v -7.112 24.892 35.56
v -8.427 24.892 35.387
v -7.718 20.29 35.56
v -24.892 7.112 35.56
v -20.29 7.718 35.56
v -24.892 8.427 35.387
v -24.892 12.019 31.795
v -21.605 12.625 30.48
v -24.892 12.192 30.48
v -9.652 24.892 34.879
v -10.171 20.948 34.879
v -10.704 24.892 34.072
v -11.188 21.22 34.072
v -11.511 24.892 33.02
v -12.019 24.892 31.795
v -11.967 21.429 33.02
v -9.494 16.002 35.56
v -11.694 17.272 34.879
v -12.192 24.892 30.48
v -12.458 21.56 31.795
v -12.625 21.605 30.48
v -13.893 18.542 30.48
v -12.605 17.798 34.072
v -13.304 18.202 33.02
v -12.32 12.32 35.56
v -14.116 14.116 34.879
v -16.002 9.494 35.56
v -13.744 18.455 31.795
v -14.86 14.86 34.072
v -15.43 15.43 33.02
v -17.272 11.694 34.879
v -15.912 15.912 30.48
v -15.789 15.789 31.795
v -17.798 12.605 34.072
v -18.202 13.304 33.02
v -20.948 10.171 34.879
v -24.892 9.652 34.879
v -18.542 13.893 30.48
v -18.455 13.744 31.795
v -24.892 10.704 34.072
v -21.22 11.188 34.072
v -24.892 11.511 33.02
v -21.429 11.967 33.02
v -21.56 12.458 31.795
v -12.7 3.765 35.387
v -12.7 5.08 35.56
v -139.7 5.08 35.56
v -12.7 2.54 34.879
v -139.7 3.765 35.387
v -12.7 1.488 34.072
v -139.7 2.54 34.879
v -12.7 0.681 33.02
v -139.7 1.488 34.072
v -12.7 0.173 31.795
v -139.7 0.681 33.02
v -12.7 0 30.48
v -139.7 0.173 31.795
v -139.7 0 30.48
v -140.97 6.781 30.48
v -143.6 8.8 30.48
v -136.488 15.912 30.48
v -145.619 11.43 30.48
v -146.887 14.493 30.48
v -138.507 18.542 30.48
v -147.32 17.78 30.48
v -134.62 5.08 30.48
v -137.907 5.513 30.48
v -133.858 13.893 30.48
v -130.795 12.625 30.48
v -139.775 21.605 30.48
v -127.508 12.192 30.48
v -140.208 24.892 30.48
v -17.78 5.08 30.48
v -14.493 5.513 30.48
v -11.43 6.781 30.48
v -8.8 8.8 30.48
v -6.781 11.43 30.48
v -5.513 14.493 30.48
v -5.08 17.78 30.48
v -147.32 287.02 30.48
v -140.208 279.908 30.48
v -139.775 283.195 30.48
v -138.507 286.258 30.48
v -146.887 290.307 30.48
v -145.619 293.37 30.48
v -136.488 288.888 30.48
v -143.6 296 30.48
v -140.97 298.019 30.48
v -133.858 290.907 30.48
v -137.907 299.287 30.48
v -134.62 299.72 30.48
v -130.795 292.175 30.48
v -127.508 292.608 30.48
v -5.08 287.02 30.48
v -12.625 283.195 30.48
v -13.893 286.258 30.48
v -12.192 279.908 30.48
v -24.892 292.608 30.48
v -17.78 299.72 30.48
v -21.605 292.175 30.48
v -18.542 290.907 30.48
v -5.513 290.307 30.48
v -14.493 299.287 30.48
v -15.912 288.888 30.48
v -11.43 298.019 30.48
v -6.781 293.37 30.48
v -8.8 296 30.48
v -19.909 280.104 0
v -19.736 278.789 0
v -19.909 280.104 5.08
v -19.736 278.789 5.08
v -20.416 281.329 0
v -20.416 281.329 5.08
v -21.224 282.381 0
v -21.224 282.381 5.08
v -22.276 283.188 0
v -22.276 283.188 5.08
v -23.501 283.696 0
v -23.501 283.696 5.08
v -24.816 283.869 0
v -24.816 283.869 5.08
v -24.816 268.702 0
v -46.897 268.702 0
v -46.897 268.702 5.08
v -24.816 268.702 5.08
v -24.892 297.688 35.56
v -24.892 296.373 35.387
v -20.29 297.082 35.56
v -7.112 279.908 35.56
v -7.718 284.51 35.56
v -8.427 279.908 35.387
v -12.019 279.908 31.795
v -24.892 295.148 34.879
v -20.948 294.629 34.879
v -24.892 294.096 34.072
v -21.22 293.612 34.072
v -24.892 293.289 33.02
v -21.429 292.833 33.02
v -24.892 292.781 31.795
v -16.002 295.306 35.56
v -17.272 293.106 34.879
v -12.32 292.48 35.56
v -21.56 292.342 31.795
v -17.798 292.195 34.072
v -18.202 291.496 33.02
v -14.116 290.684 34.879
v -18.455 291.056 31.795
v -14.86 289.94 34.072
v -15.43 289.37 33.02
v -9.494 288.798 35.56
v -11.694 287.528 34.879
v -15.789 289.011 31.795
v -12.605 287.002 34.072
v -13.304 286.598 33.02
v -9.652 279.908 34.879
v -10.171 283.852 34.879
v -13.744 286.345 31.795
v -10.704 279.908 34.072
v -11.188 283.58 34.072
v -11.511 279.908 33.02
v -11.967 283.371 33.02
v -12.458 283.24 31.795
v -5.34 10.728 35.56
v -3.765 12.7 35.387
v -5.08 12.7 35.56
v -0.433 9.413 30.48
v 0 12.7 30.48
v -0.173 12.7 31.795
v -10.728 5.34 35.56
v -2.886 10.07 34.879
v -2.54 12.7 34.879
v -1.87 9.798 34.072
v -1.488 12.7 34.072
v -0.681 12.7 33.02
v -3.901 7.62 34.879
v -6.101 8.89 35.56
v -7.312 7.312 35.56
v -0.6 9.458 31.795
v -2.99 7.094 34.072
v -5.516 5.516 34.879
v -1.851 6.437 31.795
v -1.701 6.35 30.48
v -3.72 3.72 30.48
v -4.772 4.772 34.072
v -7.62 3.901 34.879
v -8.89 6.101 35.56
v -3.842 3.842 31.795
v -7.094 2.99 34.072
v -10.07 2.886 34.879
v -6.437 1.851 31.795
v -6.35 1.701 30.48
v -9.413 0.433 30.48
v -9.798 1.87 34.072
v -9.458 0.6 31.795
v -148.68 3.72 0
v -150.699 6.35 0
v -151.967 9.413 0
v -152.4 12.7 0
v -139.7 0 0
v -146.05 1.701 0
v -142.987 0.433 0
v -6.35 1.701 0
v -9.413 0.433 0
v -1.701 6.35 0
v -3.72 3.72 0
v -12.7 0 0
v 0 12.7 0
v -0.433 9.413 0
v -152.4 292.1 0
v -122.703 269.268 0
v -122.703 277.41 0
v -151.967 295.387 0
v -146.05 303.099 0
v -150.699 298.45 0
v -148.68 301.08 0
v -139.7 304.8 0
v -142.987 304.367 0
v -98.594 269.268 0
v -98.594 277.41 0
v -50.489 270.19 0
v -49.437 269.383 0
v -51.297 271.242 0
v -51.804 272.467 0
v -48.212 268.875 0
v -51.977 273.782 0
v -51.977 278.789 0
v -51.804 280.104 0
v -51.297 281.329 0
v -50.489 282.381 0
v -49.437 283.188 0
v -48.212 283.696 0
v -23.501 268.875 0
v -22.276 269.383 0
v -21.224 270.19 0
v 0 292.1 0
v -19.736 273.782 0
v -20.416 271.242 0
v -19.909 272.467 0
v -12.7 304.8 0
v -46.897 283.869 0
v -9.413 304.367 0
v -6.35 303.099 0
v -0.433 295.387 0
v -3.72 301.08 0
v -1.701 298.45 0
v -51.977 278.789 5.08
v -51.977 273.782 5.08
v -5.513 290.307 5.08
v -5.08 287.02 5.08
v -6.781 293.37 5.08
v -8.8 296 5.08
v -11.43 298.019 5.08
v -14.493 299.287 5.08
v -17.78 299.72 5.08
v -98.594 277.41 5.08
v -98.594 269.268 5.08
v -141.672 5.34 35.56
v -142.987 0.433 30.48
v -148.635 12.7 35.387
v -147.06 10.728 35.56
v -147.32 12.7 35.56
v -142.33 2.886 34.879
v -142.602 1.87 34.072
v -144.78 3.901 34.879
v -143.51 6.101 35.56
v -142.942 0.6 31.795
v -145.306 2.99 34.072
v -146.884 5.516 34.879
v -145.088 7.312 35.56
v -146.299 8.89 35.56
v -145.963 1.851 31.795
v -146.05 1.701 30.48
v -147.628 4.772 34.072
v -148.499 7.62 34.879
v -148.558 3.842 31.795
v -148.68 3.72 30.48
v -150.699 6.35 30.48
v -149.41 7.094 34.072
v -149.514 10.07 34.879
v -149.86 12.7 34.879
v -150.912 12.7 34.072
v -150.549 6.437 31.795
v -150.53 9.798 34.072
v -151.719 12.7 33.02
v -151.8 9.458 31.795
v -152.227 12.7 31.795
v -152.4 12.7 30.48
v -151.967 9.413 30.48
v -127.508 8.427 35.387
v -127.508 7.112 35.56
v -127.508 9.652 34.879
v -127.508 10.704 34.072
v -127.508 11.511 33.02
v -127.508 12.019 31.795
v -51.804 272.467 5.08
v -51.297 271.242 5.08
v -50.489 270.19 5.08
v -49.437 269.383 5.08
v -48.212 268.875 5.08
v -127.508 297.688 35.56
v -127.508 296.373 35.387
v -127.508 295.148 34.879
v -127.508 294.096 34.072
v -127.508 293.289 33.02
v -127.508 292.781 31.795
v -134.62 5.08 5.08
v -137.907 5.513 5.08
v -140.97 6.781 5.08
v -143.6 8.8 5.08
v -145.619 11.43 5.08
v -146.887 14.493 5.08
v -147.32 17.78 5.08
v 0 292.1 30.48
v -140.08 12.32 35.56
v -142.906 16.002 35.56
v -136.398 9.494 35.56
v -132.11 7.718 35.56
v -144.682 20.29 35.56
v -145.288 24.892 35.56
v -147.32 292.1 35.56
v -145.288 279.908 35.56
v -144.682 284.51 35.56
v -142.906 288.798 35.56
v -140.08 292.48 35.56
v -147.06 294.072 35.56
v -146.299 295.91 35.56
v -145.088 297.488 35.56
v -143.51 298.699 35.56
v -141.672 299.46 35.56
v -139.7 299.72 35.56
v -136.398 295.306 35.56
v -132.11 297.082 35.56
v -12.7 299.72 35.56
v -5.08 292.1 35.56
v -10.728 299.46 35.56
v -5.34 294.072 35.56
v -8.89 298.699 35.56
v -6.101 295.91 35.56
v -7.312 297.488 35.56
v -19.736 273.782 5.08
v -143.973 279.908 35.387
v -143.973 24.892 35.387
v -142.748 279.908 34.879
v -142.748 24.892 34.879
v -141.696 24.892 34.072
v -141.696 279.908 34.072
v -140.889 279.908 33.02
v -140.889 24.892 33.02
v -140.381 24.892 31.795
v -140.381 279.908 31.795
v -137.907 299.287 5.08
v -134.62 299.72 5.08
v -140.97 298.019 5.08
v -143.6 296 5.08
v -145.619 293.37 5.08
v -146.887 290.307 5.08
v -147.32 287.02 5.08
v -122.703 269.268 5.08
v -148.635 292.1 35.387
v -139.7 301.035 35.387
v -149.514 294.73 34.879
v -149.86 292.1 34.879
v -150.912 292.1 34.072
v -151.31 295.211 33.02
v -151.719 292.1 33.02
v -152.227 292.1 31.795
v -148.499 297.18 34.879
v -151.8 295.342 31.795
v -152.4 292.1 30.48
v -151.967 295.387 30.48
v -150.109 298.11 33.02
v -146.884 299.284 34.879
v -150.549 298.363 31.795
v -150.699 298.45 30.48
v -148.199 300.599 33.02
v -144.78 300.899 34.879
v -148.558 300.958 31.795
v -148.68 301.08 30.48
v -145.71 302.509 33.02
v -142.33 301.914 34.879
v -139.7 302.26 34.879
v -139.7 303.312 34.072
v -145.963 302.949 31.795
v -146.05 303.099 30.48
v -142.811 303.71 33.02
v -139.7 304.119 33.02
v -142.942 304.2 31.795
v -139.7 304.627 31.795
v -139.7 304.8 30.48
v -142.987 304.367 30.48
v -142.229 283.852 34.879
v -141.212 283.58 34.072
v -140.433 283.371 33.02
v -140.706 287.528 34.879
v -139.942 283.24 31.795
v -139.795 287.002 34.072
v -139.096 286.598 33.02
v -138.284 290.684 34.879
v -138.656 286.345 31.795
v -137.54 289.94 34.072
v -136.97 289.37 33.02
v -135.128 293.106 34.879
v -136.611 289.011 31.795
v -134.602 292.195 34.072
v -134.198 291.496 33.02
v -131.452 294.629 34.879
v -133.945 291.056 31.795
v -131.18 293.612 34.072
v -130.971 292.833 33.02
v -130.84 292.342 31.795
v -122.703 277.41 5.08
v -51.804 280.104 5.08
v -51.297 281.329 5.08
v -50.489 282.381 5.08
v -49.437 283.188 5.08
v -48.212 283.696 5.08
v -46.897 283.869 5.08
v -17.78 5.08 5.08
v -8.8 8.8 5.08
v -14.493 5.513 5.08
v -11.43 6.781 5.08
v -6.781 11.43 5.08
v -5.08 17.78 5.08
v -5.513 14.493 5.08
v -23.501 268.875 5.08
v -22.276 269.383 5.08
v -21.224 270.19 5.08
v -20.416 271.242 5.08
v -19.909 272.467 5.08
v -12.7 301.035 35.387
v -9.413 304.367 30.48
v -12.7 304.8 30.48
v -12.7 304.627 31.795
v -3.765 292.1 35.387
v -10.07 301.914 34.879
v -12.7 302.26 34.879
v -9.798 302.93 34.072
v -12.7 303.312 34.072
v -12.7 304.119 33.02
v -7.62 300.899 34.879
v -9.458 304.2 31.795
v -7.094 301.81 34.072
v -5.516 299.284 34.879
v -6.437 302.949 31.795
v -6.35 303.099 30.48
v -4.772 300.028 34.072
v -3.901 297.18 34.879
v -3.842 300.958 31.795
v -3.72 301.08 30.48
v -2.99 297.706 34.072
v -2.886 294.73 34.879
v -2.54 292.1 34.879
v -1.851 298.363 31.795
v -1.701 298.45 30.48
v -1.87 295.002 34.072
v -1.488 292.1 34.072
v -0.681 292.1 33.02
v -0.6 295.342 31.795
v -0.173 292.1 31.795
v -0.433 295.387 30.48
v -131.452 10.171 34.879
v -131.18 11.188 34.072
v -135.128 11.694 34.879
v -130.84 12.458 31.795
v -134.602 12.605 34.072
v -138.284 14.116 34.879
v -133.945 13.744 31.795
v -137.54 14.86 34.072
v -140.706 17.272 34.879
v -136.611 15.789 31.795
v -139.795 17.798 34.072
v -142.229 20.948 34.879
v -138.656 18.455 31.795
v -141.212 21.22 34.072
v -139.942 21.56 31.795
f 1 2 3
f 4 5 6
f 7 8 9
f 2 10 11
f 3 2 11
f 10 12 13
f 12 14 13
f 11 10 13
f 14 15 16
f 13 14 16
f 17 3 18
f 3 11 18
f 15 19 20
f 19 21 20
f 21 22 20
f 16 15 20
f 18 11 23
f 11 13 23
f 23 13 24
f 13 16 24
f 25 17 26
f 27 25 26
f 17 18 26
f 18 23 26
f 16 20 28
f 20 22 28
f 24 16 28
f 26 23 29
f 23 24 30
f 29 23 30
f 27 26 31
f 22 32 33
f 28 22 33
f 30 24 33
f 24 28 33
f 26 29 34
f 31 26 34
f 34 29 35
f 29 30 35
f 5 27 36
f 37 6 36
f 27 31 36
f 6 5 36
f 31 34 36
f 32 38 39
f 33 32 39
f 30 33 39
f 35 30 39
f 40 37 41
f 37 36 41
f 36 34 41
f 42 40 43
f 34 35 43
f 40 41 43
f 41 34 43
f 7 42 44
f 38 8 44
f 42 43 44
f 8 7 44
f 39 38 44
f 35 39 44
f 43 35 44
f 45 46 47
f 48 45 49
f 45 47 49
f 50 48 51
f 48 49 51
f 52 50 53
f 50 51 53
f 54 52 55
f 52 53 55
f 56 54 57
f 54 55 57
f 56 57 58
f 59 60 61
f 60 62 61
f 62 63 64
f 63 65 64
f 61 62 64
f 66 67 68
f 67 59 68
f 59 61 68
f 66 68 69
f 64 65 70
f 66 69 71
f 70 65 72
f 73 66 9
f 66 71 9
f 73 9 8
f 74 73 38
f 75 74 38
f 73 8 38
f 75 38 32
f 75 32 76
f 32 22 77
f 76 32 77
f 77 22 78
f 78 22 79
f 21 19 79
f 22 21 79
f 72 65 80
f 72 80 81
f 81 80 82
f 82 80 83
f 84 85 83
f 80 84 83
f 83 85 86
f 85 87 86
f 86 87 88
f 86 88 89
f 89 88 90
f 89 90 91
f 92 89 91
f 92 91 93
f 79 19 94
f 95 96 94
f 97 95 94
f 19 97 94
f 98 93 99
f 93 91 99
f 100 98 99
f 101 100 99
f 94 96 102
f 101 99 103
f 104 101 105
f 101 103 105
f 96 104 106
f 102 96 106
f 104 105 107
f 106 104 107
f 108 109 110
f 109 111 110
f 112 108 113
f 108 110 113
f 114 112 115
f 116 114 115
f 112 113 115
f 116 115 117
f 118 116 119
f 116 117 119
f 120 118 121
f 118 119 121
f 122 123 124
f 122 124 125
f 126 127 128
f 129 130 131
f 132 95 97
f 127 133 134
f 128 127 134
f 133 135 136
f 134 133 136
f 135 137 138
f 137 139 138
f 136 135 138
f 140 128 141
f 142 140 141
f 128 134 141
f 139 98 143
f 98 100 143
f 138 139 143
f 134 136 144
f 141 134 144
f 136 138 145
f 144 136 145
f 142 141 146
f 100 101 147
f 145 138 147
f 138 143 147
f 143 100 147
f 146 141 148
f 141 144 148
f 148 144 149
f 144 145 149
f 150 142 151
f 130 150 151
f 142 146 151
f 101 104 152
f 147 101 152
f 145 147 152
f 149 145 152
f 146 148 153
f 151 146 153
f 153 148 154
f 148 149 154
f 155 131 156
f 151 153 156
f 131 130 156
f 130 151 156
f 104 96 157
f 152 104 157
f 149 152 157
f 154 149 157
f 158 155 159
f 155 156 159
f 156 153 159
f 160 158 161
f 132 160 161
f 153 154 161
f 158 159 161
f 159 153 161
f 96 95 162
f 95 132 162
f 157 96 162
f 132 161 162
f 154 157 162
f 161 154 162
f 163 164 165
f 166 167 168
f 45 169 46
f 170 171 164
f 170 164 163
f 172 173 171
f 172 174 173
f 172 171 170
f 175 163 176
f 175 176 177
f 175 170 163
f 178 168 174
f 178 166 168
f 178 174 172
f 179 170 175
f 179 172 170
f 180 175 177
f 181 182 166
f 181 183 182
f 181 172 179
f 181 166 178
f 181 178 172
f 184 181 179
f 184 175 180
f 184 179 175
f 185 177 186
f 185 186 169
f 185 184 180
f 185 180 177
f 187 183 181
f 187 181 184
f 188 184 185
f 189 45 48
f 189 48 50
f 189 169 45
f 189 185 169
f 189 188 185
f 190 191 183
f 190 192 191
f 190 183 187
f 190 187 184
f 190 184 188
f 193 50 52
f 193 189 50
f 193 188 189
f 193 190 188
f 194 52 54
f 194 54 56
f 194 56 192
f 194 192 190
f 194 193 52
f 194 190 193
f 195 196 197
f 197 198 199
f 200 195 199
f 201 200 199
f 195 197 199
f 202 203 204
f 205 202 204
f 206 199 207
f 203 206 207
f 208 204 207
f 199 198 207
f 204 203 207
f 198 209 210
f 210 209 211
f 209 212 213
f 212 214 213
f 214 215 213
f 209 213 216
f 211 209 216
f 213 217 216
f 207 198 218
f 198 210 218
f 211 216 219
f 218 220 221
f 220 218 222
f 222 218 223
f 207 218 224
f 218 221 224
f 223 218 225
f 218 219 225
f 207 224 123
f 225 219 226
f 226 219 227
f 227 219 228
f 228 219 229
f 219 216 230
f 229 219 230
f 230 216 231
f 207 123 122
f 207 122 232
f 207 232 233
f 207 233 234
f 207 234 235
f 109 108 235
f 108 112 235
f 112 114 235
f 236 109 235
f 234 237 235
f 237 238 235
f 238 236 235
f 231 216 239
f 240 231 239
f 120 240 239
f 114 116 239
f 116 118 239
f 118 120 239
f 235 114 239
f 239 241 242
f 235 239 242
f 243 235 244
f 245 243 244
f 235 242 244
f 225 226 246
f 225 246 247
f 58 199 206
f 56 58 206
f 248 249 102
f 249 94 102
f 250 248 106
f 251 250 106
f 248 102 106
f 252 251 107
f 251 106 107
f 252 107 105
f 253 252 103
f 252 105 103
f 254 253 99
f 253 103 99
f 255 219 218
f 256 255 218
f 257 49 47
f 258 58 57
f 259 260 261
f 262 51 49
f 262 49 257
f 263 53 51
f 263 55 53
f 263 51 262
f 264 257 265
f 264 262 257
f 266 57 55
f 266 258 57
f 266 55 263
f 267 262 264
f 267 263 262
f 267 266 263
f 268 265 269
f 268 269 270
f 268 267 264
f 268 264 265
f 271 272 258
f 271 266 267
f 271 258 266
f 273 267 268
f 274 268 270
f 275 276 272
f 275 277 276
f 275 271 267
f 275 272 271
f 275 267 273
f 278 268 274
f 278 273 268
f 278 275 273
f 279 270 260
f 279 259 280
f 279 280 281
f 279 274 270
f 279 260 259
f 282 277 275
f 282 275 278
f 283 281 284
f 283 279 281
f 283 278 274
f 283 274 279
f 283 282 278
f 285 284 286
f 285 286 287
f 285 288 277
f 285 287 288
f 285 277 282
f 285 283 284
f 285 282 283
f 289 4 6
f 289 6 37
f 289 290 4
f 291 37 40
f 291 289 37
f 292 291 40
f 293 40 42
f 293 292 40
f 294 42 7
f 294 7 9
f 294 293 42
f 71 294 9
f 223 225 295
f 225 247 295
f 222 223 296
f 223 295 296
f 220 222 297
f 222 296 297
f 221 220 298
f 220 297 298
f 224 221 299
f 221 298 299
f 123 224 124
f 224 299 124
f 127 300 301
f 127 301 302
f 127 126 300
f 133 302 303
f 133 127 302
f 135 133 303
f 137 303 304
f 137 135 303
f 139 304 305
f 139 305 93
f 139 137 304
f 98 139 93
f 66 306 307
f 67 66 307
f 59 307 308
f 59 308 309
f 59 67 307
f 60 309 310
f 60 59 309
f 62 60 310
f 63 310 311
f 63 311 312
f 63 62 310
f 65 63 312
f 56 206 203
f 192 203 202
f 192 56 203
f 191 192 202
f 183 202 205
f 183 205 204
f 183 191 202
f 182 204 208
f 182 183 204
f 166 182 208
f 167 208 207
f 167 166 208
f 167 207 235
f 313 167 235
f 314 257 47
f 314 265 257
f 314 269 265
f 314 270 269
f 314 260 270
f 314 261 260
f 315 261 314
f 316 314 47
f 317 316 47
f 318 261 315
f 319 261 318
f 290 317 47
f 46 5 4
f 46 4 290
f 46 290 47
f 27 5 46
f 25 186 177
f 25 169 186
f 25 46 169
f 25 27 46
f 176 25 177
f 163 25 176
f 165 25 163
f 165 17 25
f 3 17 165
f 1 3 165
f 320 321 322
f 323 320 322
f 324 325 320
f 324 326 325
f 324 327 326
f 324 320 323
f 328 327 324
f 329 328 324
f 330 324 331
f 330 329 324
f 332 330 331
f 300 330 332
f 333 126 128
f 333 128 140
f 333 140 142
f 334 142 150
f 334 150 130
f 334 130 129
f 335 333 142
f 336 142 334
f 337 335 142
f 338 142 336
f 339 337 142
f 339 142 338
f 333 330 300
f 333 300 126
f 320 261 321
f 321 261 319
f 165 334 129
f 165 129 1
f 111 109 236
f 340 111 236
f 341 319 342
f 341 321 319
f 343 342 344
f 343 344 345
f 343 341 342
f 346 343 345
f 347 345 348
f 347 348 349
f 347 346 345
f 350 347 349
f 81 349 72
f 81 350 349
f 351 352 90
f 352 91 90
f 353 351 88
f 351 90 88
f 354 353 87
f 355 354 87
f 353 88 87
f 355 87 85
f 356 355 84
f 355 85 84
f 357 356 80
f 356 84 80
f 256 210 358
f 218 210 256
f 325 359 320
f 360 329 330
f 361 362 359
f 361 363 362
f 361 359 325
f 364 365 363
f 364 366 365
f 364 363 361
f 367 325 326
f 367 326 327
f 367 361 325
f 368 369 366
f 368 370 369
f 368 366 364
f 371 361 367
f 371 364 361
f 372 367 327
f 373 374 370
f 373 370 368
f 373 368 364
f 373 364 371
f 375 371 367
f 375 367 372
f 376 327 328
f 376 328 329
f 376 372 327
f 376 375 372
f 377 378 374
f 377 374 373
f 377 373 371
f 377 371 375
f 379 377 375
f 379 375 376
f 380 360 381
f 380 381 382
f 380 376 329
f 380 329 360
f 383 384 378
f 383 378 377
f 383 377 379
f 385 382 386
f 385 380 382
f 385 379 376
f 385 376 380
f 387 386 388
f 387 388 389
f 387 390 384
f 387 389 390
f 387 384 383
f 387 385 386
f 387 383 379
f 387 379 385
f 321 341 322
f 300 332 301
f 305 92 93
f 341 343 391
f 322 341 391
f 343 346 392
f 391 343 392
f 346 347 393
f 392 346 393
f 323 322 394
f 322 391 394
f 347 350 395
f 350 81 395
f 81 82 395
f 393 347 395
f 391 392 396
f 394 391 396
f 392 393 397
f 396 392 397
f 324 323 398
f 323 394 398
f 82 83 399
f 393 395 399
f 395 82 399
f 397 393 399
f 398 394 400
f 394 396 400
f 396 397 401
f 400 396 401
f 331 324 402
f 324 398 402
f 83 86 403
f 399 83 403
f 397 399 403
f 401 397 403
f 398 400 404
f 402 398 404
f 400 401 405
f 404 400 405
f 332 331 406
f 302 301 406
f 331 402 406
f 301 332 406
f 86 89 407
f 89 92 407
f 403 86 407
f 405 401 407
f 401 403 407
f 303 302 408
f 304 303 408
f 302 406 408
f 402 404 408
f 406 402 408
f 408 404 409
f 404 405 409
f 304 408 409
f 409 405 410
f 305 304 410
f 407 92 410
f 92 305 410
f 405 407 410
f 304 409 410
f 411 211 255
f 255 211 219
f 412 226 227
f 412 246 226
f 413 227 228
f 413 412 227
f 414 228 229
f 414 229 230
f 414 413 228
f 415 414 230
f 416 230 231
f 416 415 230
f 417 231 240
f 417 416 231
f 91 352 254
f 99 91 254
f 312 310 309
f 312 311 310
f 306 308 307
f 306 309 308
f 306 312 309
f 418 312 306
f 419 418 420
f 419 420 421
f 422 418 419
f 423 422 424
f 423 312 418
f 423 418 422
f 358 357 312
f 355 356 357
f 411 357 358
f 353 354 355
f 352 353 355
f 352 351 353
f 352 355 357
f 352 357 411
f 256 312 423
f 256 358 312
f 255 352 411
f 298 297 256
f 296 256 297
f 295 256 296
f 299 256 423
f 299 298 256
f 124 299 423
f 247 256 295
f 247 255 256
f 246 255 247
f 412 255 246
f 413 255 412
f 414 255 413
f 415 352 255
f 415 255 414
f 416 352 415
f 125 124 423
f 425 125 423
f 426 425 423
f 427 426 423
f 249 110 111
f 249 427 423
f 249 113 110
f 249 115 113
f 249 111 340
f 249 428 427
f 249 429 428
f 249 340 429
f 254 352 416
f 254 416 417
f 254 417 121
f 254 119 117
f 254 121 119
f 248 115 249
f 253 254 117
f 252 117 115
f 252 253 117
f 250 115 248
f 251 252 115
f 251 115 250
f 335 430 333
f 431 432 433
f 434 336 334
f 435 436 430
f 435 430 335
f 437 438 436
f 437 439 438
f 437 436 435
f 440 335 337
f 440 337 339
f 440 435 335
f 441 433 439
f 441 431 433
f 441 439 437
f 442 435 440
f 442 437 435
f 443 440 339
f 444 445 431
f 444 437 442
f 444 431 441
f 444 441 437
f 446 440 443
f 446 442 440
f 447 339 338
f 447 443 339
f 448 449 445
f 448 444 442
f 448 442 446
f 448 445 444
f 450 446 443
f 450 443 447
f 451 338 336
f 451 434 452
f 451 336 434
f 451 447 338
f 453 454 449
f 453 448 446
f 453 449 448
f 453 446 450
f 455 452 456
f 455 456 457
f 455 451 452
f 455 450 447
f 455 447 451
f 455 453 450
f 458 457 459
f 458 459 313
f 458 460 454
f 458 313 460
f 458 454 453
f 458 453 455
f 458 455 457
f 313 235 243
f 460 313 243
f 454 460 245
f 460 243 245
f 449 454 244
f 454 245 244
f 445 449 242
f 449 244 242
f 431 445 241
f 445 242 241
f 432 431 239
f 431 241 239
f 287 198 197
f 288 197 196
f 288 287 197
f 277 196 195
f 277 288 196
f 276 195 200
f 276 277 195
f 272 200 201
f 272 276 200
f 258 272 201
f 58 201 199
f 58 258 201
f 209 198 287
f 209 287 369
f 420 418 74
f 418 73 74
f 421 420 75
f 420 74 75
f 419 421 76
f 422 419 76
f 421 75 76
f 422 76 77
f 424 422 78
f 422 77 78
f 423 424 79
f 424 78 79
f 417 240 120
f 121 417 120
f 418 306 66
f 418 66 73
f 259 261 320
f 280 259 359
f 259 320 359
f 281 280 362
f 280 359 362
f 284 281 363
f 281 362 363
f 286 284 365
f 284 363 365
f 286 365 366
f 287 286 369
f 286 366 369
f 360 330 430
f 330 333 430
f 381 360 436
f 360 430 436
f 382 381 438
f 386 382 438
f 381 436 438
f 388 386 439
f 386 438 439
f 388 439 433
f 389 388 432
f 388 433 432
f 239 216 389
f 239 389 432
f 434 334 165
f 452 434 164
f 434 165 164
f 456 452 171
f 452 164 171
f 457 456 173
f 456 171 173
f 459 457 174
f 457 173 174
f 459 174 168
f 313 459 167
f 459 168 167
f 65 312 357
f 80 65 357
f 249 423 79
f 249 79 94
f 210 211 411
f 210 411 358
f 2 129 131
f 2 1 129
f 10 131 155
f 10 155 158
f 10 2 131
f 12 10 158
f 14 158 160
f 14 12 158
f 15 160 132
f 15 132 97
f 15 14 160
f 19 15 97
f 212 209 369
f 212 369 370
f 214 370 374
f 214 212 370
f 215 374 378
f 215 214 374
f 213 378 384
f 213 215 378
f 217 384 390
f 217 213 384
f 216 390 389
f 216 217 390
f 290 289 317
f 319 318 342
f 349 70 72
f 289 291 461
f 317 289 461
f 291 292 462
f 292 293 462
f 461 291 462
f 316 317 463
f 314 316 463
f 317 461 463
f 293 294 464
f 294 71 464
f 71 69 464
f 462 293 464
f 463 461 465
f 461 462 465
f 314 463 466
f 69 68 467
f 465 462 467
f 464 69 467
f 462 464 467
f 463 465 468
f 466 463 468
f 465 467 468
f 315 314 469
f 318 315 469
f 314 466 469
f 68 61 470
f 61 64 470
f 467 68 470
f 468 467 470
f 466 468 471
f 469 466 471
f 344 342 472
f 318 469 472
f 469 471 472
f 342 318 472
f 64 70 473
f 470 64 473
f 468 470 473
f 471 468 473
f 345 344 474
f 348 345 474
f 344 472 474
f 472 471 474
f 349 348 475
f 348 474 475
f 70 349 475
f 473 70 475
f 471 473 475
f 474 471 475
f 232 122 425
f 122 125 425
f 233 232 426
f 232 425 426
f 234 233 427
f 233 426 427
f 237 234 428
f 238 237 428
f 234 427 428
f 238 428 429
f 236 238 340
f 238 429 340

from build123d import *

# Parameters (mm, degrees)
F0_W      = 152.4
F0_H      = 304.8
F1_DEPTH  = 5.08
F2_W      = 152.4
F2_H      = 304.8
F2_W_2    = 142.2399785995
F2_H_2    = 294.6399785995
F3_DEPTH  = 25.4
F4_W      = 152.4
F4_H      = 304.8
F4_W_2    = 142.2399785995
F4_H_2    = 294.6399785995
F4_W_3    = 128.0160005927
F4_H_3    = 280.4160005927
F5_DEPTH  = 5.08
F6_R      = 12.7
F7_W      = 32.2413705289
F7_H      = 15.166670084
F8_DEPTH  = 25.4
F9_R      = 5.07999
F10_W     = 24.1091474891
F10_H     = 8.1412196159
F11_DEPTH = 25.4


# Not quite as in the source:
# - a fillet or chamfer is up to 0.001 mm smaller than in the source, because OpenCascade refuses the exact size


with BuildPart() as f1:
    # F0 (on Top) → F1 (new body)
    with BuildSketch(Plane.XY):
        with Locations((-76.2, 152.4)):
            Rectangle(F0_W, F0_H)
    extrude(amount=F1_DEPTH)

    # F2 (on face) → F3 (join)
    with BuildSketch(Plane.XY.offset(5.08)):
        with Locations((-76.2, 152.4)):
            Rectangle(F2_W, F2_H)
        with Locations((-76.2, 152.4)):
            Rectangle(F2_W_2, F2_H_2, mode=Mode.SUBTRACT)
    extrude(amount=F3_DEPTH)

    # F4 (on face) → F5 (join)
    with BuildSketch(Plane.XY.offset(30.48)):
        with Locations((-76.2, 152.4)):
            Rectangle(F4_W, F4_H)
        with Locations((-76.2, 152.4)):
            Rectangle(F4_W_2, F4_H_2, mode=Mode.SUBTRACT)
        with Locations((-76.2, 152.4)):
            Rectangle(F4_W_2, F4_H_2)
        with Locations((-76.2, 152.4)):
            Rectangle(F4_W_3, F4_H_3, mode=Mode.SUBTRACT)
    extrude(amount=F5_DEPTH)

    # F6
    f6_edges = [f1.edges().sort_by_distance(p)[0] for p in [
        (-152.4, 0, 17.78),
        (0, 0, 17.78),
        (0, 304.8, 17.78),
        (-152.4, 304.8, 17.78),
        (-147.319989, 5.080011, 17.78),
        (-5.080011, 5.080011, 17.78),
        (-5.080011, 299.719989, 17.78),
        (-147.319989, 299.719989, 17.78),
        (-140.208, 12.192, 33.02),
        (-12.192, 292.608, 33.02),
        (-140.208, 292.608, 33.02),
        (-12.192, 12.192, 33.02),
    ]]
    fillet(f6_edges, radius=F6_R)

    # F7 (on face) → F8 (cut)
    with BuildSketch(Plane(origin=(0, 0, 0), x_dir=(1, 0, 0), z_dir=(0, 0, -1))):
        with Locations((-35.8565431088, -276.2855738401)):
            Rectangle(F7_W, F7_H)
    extrude(amount=-F8_DEPTH, mode=Mode.SUBTRACT)

    # F9 (radius 5.08 in the source; OpenCascade refuses exactly that, so slightly less here)
    f9_edges = [f1.edges().sort_by_distance(p)[0] for p in [
        (-51.977228, 283.868909, 2.54),
        (-19.735858, 283.868909, 2.54),
        (-19.735858, 268.702239, 2.54),
        (-51.977228, 268.702239, 2.54),
        (-76.2, 304.8, 35.56),
        (-3.719744, 301.080256, 35.56),
        (-148.680256, 301.080256, 35.56),
        (0, 152.4, 35.56),
        (-152.4, 152.4, 35.56),
        (-3.719744, 3.719744, 35.56),
        (-148.680256, 3.719744, 35.56),
        (-76.2, 0, 35.56),
        (-140.208, 152.4, 35.56),
        (-136.488256, 15.911744, 35.56),
        (-136.488256, 288.888256, 35.56),
        (-76.2, 12.192, 35.56),
        (-76.2, 292.608, 35.56),
        (-15.911744, 15.911744, 35.56),
        (-15.911744, 288.888256, 35.56),
        (-12.192, 152.4, 35.56),
    ]]
    fillet(f9_edges, radius=F9_R)

    # F10 (on face) → F11 (cut)
    with BuildSketch(Plane(origin=(0, 0, 0), x_dir=(1, 0, 0), z_dir=(0, 0, -1))):
        with Locations((-110.6483452022, -273.3389437199)):
            Rectangle(F10_W, F10_H)
    extrude(amount=-F11_DEPTH, mode=Mode.SUBTRACT)


solid = f1.part
